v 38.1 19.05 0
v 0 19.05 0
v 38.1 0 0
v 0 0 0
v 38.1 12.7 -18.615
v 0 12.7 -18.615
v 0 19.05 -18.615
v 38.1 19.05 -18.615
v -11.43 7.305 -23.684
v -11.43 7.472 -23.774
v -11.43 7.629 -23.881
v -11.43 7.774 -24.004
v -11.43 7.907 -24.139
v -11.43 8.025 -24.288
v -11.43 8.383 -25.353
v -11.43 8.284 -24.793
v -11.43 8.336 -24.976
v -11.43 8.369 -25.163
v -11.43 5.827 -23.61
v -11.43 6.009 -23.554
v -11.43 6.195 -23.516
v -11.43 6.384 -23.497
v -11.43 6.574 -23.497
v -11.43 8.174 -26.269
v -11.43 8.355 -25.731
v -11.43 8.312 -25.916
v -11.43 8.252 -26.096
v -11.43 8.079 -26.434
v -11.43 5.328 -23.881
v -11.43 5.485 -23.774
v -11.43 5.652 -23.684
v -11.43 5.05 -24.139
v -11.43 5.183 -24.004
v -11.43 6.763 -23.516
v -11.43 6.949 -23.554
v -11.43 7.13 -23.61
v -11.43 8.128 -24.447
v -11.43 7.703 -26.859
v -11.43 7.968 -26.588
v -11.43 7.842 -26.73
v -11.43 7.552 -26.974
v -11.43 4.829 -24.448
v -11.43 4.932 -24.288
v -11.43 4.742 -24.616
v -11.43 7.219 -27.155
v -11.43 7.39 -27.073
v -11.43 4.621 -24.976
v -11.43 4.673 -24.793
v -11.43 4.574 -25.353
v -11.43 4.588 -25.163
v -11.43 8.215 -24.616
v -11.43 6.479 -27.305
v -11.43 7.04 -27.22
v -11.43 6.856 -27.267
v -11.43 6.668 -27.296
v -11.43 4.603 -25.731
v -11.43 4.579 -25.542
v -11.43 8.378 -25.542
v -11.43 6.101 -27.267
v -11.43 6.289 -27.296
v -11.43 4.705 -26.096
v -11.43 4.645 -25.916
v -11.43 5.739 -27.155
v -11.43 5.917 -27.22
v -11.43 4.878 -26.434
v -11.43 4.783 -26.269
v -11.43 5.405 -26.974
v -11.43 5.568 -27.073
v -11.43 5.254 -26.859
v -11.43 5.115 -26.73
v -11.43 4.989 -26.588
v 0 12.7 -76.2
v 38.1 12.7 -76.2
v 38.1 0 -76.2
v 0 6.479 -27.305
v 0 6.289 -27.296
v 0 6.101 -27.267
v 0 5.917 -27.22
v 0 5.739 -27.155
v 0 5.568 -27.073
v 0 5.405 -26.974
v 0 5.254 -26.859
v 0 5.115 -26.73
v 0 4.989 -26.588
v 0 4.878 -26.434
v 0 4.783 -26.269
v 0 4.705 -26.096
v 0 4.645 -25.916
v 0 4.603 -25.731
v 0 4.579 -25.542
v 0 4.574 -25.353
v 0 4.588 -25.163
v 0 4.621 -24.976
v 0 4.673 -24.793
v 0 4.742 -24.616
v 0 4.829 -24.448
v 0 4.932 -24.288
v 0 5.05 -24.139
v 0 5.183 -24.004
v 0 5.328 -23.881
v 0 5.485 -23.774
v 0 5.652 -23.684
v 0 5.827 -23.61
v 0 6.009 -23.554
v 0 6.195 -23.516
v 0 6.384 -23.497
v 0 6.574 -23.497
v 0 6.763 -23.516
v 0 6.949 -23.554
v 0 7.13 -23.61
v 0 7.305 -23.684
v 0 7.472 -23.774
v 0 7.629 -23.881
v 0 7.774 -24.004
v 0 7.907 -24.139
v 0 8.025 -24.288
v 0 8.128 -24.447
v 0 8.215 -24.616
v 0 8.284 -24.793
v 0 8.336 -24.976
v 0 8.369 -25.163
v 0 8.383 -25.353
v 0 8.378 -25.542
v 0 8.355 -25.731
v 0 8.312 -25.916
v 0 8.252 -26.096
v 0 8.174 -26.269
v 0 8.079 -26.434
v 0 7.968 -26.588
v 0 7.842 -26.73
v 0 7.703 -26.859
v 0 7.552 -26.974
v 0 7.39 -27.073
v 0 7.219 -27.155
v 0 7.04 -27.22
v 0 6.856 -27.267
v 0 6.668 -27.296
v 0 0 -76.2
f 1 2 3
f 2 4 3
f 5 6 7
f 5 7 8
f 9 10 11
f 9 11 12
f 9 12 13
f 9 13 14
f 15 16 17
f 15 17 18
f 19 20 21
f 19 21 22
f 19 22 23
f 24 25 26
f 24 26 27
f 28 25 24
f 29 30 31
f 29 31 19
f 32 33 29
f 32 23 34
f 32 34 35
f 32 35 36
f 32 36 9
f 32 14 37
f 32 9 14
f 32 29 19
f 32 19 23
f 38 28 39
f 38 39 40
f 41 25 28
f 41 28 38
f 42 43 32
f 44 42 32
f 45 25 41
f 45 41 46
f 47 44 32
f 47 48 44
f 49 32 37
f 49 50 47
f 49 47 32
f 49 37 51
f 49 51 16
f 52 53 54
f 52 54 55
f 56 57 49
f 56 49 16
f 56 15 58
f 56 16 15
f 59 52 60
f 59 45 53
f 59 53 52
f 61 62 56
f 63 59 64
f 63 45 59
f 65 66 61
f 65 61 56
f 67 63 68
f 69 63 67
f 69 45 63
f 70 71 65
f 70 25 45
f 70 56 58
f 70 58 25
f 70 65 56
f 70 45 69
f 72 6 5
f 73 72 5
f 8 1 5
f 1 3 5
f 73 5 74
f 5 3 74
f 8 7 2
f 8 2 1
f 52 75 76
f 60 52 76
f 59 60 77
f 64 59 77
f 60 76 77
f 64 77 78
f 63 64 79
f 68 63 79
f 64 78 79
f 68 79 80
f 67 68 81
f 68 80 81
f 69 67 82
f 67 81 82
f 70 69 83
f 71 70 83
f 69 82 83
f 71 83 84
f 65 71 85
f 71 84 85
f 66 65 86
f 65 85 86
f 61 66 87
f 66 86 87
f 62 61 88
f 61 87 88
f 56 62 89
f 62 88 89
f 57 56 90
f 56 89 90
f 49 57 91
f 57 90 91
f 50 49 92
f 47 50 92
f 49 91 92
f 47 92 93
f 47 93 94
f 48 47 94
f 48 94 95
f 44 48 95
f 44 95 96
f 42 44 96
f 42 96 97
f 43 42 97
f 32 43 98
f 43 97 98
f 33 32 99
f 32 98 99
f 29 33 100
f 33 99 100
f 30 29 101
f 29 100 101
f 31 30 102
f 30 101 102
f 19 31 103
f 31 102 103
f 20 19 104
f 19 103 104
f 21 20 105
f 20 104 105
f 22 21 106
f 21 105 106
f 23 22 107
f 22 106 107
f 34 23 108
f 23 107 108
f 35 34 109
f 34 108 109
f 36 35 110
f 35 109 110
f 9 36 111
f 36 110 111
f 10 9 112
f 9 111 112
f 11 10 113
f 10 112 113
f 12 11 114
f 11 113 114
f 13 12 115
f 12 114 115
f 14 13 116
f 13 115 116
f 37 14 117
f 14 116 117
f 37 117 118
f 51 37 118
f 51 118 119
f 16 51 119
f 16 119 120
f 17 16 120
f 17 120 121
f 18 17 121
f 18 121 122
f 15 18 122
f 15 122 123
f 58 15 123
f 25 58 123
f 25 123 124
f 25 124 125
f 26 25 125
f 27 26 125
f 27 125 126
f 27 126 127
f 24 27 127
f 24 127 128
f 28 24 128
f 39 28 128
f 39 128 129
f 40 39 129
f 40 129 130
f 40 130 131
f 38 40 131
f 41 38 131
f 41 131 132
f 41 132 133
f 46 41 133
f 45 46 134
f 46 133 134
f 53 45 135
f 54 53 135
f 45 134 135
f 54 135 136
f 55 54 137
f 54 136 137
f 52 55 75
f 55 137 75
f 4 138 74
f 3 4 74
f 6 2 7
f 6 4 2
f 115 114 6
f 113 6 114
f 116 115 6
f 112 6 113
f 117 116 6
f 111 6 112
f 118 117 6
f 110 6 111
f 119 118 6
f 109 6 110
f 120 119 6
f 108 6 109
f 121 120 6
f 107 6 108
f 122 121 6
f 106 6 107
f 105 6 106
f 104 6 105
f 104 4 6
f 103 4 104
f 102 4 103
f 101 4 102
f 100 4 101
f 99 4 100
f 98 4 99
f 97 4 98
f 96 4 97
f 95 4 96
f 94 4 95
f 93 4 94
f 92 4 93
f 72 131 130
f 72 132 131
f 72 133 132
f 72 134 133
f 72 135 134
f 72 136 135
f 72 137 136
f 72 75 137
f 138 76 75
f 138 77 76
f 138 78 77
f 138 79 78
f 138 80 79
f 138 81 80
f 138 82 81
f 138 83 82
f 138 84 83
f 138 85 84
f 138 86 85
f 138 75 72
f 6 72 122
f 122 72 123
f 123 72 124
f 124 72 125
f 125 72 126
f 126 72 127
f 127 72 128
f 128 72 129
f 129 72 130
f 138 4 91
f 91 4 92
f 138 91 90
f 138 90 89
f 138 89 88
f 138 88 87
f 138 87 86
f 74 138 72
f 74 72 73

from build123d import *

# Parameters (mm, degrees)
SKETCH2_W           = 38.1
SKETCH2_H           = 76.2
BOSS_EXTRUDE1_DEPTH = 12.7
SKETCH3_R           = 1.905
BOSS_EXTRUDE3_DEPTH = 11.43
SKETCH5_W           = 38.1
SKETCH5_H           = 18.614666354
BOSS_EXTRUDE5_DEPTH = 2.54
SKETCH6_W           = 38.1
SKETCH6_H           = 18.614666354
BOSS_EXTRUDE6_DEPTH = 3.81


with BuildPart() as part:
    # Sketch2 → Boss-Extrude1 (new body)
    with BuildSketch(Plane(origin=(0, 0, 0), x_dir=(1, 0, 0), z_dir=(0, 1, 0))):
        with Locations((19.05, 38.1)):
            Rectangle(SKETCH2_W, SKETCH2_H)
    extrude(amount=BOSS_EXTRUDE1_DEPTH)

    # Sketch3 → Boss-Extrude3 (add)
    with BuildSketch(Plane.ZY):
        with Locations(Location((-25.4, 6.478602977, 0), (0, 0, 180))):
            Circle(SKETCH3_R)
    extrude(amount=BOSS_EXTRUDE3_DEPTH)

    # Sketch5 → Boss-Extrude5 (add)
    with BuildSketch(Plane(origin=(0, 12.7, 0), x_dir=(1, 0, 0), z_dir=(0, 1, 0))):
        with Locations((19.05, 9.307333177)):
            Rectangle(SKETCH5_W, SKETCH5_H)
    extrude(amount=BOSS_EXTRUDE5_DEPTH)

    # Sketch6 → Boss-Extrude6 (add)
    with BuildSketch(Plane(origin=(0, 15.24, 0), x_dir=(1, 0, 0), z_dir=(0, 1, 0))):
        with Locations((19.05, 9.307333177)):
            Rectangle(SKETCH6_W, SKETCH6_H)
    extrude(amount=BOSS_EXTRUDE6_DEPTH)


solid = part.part
